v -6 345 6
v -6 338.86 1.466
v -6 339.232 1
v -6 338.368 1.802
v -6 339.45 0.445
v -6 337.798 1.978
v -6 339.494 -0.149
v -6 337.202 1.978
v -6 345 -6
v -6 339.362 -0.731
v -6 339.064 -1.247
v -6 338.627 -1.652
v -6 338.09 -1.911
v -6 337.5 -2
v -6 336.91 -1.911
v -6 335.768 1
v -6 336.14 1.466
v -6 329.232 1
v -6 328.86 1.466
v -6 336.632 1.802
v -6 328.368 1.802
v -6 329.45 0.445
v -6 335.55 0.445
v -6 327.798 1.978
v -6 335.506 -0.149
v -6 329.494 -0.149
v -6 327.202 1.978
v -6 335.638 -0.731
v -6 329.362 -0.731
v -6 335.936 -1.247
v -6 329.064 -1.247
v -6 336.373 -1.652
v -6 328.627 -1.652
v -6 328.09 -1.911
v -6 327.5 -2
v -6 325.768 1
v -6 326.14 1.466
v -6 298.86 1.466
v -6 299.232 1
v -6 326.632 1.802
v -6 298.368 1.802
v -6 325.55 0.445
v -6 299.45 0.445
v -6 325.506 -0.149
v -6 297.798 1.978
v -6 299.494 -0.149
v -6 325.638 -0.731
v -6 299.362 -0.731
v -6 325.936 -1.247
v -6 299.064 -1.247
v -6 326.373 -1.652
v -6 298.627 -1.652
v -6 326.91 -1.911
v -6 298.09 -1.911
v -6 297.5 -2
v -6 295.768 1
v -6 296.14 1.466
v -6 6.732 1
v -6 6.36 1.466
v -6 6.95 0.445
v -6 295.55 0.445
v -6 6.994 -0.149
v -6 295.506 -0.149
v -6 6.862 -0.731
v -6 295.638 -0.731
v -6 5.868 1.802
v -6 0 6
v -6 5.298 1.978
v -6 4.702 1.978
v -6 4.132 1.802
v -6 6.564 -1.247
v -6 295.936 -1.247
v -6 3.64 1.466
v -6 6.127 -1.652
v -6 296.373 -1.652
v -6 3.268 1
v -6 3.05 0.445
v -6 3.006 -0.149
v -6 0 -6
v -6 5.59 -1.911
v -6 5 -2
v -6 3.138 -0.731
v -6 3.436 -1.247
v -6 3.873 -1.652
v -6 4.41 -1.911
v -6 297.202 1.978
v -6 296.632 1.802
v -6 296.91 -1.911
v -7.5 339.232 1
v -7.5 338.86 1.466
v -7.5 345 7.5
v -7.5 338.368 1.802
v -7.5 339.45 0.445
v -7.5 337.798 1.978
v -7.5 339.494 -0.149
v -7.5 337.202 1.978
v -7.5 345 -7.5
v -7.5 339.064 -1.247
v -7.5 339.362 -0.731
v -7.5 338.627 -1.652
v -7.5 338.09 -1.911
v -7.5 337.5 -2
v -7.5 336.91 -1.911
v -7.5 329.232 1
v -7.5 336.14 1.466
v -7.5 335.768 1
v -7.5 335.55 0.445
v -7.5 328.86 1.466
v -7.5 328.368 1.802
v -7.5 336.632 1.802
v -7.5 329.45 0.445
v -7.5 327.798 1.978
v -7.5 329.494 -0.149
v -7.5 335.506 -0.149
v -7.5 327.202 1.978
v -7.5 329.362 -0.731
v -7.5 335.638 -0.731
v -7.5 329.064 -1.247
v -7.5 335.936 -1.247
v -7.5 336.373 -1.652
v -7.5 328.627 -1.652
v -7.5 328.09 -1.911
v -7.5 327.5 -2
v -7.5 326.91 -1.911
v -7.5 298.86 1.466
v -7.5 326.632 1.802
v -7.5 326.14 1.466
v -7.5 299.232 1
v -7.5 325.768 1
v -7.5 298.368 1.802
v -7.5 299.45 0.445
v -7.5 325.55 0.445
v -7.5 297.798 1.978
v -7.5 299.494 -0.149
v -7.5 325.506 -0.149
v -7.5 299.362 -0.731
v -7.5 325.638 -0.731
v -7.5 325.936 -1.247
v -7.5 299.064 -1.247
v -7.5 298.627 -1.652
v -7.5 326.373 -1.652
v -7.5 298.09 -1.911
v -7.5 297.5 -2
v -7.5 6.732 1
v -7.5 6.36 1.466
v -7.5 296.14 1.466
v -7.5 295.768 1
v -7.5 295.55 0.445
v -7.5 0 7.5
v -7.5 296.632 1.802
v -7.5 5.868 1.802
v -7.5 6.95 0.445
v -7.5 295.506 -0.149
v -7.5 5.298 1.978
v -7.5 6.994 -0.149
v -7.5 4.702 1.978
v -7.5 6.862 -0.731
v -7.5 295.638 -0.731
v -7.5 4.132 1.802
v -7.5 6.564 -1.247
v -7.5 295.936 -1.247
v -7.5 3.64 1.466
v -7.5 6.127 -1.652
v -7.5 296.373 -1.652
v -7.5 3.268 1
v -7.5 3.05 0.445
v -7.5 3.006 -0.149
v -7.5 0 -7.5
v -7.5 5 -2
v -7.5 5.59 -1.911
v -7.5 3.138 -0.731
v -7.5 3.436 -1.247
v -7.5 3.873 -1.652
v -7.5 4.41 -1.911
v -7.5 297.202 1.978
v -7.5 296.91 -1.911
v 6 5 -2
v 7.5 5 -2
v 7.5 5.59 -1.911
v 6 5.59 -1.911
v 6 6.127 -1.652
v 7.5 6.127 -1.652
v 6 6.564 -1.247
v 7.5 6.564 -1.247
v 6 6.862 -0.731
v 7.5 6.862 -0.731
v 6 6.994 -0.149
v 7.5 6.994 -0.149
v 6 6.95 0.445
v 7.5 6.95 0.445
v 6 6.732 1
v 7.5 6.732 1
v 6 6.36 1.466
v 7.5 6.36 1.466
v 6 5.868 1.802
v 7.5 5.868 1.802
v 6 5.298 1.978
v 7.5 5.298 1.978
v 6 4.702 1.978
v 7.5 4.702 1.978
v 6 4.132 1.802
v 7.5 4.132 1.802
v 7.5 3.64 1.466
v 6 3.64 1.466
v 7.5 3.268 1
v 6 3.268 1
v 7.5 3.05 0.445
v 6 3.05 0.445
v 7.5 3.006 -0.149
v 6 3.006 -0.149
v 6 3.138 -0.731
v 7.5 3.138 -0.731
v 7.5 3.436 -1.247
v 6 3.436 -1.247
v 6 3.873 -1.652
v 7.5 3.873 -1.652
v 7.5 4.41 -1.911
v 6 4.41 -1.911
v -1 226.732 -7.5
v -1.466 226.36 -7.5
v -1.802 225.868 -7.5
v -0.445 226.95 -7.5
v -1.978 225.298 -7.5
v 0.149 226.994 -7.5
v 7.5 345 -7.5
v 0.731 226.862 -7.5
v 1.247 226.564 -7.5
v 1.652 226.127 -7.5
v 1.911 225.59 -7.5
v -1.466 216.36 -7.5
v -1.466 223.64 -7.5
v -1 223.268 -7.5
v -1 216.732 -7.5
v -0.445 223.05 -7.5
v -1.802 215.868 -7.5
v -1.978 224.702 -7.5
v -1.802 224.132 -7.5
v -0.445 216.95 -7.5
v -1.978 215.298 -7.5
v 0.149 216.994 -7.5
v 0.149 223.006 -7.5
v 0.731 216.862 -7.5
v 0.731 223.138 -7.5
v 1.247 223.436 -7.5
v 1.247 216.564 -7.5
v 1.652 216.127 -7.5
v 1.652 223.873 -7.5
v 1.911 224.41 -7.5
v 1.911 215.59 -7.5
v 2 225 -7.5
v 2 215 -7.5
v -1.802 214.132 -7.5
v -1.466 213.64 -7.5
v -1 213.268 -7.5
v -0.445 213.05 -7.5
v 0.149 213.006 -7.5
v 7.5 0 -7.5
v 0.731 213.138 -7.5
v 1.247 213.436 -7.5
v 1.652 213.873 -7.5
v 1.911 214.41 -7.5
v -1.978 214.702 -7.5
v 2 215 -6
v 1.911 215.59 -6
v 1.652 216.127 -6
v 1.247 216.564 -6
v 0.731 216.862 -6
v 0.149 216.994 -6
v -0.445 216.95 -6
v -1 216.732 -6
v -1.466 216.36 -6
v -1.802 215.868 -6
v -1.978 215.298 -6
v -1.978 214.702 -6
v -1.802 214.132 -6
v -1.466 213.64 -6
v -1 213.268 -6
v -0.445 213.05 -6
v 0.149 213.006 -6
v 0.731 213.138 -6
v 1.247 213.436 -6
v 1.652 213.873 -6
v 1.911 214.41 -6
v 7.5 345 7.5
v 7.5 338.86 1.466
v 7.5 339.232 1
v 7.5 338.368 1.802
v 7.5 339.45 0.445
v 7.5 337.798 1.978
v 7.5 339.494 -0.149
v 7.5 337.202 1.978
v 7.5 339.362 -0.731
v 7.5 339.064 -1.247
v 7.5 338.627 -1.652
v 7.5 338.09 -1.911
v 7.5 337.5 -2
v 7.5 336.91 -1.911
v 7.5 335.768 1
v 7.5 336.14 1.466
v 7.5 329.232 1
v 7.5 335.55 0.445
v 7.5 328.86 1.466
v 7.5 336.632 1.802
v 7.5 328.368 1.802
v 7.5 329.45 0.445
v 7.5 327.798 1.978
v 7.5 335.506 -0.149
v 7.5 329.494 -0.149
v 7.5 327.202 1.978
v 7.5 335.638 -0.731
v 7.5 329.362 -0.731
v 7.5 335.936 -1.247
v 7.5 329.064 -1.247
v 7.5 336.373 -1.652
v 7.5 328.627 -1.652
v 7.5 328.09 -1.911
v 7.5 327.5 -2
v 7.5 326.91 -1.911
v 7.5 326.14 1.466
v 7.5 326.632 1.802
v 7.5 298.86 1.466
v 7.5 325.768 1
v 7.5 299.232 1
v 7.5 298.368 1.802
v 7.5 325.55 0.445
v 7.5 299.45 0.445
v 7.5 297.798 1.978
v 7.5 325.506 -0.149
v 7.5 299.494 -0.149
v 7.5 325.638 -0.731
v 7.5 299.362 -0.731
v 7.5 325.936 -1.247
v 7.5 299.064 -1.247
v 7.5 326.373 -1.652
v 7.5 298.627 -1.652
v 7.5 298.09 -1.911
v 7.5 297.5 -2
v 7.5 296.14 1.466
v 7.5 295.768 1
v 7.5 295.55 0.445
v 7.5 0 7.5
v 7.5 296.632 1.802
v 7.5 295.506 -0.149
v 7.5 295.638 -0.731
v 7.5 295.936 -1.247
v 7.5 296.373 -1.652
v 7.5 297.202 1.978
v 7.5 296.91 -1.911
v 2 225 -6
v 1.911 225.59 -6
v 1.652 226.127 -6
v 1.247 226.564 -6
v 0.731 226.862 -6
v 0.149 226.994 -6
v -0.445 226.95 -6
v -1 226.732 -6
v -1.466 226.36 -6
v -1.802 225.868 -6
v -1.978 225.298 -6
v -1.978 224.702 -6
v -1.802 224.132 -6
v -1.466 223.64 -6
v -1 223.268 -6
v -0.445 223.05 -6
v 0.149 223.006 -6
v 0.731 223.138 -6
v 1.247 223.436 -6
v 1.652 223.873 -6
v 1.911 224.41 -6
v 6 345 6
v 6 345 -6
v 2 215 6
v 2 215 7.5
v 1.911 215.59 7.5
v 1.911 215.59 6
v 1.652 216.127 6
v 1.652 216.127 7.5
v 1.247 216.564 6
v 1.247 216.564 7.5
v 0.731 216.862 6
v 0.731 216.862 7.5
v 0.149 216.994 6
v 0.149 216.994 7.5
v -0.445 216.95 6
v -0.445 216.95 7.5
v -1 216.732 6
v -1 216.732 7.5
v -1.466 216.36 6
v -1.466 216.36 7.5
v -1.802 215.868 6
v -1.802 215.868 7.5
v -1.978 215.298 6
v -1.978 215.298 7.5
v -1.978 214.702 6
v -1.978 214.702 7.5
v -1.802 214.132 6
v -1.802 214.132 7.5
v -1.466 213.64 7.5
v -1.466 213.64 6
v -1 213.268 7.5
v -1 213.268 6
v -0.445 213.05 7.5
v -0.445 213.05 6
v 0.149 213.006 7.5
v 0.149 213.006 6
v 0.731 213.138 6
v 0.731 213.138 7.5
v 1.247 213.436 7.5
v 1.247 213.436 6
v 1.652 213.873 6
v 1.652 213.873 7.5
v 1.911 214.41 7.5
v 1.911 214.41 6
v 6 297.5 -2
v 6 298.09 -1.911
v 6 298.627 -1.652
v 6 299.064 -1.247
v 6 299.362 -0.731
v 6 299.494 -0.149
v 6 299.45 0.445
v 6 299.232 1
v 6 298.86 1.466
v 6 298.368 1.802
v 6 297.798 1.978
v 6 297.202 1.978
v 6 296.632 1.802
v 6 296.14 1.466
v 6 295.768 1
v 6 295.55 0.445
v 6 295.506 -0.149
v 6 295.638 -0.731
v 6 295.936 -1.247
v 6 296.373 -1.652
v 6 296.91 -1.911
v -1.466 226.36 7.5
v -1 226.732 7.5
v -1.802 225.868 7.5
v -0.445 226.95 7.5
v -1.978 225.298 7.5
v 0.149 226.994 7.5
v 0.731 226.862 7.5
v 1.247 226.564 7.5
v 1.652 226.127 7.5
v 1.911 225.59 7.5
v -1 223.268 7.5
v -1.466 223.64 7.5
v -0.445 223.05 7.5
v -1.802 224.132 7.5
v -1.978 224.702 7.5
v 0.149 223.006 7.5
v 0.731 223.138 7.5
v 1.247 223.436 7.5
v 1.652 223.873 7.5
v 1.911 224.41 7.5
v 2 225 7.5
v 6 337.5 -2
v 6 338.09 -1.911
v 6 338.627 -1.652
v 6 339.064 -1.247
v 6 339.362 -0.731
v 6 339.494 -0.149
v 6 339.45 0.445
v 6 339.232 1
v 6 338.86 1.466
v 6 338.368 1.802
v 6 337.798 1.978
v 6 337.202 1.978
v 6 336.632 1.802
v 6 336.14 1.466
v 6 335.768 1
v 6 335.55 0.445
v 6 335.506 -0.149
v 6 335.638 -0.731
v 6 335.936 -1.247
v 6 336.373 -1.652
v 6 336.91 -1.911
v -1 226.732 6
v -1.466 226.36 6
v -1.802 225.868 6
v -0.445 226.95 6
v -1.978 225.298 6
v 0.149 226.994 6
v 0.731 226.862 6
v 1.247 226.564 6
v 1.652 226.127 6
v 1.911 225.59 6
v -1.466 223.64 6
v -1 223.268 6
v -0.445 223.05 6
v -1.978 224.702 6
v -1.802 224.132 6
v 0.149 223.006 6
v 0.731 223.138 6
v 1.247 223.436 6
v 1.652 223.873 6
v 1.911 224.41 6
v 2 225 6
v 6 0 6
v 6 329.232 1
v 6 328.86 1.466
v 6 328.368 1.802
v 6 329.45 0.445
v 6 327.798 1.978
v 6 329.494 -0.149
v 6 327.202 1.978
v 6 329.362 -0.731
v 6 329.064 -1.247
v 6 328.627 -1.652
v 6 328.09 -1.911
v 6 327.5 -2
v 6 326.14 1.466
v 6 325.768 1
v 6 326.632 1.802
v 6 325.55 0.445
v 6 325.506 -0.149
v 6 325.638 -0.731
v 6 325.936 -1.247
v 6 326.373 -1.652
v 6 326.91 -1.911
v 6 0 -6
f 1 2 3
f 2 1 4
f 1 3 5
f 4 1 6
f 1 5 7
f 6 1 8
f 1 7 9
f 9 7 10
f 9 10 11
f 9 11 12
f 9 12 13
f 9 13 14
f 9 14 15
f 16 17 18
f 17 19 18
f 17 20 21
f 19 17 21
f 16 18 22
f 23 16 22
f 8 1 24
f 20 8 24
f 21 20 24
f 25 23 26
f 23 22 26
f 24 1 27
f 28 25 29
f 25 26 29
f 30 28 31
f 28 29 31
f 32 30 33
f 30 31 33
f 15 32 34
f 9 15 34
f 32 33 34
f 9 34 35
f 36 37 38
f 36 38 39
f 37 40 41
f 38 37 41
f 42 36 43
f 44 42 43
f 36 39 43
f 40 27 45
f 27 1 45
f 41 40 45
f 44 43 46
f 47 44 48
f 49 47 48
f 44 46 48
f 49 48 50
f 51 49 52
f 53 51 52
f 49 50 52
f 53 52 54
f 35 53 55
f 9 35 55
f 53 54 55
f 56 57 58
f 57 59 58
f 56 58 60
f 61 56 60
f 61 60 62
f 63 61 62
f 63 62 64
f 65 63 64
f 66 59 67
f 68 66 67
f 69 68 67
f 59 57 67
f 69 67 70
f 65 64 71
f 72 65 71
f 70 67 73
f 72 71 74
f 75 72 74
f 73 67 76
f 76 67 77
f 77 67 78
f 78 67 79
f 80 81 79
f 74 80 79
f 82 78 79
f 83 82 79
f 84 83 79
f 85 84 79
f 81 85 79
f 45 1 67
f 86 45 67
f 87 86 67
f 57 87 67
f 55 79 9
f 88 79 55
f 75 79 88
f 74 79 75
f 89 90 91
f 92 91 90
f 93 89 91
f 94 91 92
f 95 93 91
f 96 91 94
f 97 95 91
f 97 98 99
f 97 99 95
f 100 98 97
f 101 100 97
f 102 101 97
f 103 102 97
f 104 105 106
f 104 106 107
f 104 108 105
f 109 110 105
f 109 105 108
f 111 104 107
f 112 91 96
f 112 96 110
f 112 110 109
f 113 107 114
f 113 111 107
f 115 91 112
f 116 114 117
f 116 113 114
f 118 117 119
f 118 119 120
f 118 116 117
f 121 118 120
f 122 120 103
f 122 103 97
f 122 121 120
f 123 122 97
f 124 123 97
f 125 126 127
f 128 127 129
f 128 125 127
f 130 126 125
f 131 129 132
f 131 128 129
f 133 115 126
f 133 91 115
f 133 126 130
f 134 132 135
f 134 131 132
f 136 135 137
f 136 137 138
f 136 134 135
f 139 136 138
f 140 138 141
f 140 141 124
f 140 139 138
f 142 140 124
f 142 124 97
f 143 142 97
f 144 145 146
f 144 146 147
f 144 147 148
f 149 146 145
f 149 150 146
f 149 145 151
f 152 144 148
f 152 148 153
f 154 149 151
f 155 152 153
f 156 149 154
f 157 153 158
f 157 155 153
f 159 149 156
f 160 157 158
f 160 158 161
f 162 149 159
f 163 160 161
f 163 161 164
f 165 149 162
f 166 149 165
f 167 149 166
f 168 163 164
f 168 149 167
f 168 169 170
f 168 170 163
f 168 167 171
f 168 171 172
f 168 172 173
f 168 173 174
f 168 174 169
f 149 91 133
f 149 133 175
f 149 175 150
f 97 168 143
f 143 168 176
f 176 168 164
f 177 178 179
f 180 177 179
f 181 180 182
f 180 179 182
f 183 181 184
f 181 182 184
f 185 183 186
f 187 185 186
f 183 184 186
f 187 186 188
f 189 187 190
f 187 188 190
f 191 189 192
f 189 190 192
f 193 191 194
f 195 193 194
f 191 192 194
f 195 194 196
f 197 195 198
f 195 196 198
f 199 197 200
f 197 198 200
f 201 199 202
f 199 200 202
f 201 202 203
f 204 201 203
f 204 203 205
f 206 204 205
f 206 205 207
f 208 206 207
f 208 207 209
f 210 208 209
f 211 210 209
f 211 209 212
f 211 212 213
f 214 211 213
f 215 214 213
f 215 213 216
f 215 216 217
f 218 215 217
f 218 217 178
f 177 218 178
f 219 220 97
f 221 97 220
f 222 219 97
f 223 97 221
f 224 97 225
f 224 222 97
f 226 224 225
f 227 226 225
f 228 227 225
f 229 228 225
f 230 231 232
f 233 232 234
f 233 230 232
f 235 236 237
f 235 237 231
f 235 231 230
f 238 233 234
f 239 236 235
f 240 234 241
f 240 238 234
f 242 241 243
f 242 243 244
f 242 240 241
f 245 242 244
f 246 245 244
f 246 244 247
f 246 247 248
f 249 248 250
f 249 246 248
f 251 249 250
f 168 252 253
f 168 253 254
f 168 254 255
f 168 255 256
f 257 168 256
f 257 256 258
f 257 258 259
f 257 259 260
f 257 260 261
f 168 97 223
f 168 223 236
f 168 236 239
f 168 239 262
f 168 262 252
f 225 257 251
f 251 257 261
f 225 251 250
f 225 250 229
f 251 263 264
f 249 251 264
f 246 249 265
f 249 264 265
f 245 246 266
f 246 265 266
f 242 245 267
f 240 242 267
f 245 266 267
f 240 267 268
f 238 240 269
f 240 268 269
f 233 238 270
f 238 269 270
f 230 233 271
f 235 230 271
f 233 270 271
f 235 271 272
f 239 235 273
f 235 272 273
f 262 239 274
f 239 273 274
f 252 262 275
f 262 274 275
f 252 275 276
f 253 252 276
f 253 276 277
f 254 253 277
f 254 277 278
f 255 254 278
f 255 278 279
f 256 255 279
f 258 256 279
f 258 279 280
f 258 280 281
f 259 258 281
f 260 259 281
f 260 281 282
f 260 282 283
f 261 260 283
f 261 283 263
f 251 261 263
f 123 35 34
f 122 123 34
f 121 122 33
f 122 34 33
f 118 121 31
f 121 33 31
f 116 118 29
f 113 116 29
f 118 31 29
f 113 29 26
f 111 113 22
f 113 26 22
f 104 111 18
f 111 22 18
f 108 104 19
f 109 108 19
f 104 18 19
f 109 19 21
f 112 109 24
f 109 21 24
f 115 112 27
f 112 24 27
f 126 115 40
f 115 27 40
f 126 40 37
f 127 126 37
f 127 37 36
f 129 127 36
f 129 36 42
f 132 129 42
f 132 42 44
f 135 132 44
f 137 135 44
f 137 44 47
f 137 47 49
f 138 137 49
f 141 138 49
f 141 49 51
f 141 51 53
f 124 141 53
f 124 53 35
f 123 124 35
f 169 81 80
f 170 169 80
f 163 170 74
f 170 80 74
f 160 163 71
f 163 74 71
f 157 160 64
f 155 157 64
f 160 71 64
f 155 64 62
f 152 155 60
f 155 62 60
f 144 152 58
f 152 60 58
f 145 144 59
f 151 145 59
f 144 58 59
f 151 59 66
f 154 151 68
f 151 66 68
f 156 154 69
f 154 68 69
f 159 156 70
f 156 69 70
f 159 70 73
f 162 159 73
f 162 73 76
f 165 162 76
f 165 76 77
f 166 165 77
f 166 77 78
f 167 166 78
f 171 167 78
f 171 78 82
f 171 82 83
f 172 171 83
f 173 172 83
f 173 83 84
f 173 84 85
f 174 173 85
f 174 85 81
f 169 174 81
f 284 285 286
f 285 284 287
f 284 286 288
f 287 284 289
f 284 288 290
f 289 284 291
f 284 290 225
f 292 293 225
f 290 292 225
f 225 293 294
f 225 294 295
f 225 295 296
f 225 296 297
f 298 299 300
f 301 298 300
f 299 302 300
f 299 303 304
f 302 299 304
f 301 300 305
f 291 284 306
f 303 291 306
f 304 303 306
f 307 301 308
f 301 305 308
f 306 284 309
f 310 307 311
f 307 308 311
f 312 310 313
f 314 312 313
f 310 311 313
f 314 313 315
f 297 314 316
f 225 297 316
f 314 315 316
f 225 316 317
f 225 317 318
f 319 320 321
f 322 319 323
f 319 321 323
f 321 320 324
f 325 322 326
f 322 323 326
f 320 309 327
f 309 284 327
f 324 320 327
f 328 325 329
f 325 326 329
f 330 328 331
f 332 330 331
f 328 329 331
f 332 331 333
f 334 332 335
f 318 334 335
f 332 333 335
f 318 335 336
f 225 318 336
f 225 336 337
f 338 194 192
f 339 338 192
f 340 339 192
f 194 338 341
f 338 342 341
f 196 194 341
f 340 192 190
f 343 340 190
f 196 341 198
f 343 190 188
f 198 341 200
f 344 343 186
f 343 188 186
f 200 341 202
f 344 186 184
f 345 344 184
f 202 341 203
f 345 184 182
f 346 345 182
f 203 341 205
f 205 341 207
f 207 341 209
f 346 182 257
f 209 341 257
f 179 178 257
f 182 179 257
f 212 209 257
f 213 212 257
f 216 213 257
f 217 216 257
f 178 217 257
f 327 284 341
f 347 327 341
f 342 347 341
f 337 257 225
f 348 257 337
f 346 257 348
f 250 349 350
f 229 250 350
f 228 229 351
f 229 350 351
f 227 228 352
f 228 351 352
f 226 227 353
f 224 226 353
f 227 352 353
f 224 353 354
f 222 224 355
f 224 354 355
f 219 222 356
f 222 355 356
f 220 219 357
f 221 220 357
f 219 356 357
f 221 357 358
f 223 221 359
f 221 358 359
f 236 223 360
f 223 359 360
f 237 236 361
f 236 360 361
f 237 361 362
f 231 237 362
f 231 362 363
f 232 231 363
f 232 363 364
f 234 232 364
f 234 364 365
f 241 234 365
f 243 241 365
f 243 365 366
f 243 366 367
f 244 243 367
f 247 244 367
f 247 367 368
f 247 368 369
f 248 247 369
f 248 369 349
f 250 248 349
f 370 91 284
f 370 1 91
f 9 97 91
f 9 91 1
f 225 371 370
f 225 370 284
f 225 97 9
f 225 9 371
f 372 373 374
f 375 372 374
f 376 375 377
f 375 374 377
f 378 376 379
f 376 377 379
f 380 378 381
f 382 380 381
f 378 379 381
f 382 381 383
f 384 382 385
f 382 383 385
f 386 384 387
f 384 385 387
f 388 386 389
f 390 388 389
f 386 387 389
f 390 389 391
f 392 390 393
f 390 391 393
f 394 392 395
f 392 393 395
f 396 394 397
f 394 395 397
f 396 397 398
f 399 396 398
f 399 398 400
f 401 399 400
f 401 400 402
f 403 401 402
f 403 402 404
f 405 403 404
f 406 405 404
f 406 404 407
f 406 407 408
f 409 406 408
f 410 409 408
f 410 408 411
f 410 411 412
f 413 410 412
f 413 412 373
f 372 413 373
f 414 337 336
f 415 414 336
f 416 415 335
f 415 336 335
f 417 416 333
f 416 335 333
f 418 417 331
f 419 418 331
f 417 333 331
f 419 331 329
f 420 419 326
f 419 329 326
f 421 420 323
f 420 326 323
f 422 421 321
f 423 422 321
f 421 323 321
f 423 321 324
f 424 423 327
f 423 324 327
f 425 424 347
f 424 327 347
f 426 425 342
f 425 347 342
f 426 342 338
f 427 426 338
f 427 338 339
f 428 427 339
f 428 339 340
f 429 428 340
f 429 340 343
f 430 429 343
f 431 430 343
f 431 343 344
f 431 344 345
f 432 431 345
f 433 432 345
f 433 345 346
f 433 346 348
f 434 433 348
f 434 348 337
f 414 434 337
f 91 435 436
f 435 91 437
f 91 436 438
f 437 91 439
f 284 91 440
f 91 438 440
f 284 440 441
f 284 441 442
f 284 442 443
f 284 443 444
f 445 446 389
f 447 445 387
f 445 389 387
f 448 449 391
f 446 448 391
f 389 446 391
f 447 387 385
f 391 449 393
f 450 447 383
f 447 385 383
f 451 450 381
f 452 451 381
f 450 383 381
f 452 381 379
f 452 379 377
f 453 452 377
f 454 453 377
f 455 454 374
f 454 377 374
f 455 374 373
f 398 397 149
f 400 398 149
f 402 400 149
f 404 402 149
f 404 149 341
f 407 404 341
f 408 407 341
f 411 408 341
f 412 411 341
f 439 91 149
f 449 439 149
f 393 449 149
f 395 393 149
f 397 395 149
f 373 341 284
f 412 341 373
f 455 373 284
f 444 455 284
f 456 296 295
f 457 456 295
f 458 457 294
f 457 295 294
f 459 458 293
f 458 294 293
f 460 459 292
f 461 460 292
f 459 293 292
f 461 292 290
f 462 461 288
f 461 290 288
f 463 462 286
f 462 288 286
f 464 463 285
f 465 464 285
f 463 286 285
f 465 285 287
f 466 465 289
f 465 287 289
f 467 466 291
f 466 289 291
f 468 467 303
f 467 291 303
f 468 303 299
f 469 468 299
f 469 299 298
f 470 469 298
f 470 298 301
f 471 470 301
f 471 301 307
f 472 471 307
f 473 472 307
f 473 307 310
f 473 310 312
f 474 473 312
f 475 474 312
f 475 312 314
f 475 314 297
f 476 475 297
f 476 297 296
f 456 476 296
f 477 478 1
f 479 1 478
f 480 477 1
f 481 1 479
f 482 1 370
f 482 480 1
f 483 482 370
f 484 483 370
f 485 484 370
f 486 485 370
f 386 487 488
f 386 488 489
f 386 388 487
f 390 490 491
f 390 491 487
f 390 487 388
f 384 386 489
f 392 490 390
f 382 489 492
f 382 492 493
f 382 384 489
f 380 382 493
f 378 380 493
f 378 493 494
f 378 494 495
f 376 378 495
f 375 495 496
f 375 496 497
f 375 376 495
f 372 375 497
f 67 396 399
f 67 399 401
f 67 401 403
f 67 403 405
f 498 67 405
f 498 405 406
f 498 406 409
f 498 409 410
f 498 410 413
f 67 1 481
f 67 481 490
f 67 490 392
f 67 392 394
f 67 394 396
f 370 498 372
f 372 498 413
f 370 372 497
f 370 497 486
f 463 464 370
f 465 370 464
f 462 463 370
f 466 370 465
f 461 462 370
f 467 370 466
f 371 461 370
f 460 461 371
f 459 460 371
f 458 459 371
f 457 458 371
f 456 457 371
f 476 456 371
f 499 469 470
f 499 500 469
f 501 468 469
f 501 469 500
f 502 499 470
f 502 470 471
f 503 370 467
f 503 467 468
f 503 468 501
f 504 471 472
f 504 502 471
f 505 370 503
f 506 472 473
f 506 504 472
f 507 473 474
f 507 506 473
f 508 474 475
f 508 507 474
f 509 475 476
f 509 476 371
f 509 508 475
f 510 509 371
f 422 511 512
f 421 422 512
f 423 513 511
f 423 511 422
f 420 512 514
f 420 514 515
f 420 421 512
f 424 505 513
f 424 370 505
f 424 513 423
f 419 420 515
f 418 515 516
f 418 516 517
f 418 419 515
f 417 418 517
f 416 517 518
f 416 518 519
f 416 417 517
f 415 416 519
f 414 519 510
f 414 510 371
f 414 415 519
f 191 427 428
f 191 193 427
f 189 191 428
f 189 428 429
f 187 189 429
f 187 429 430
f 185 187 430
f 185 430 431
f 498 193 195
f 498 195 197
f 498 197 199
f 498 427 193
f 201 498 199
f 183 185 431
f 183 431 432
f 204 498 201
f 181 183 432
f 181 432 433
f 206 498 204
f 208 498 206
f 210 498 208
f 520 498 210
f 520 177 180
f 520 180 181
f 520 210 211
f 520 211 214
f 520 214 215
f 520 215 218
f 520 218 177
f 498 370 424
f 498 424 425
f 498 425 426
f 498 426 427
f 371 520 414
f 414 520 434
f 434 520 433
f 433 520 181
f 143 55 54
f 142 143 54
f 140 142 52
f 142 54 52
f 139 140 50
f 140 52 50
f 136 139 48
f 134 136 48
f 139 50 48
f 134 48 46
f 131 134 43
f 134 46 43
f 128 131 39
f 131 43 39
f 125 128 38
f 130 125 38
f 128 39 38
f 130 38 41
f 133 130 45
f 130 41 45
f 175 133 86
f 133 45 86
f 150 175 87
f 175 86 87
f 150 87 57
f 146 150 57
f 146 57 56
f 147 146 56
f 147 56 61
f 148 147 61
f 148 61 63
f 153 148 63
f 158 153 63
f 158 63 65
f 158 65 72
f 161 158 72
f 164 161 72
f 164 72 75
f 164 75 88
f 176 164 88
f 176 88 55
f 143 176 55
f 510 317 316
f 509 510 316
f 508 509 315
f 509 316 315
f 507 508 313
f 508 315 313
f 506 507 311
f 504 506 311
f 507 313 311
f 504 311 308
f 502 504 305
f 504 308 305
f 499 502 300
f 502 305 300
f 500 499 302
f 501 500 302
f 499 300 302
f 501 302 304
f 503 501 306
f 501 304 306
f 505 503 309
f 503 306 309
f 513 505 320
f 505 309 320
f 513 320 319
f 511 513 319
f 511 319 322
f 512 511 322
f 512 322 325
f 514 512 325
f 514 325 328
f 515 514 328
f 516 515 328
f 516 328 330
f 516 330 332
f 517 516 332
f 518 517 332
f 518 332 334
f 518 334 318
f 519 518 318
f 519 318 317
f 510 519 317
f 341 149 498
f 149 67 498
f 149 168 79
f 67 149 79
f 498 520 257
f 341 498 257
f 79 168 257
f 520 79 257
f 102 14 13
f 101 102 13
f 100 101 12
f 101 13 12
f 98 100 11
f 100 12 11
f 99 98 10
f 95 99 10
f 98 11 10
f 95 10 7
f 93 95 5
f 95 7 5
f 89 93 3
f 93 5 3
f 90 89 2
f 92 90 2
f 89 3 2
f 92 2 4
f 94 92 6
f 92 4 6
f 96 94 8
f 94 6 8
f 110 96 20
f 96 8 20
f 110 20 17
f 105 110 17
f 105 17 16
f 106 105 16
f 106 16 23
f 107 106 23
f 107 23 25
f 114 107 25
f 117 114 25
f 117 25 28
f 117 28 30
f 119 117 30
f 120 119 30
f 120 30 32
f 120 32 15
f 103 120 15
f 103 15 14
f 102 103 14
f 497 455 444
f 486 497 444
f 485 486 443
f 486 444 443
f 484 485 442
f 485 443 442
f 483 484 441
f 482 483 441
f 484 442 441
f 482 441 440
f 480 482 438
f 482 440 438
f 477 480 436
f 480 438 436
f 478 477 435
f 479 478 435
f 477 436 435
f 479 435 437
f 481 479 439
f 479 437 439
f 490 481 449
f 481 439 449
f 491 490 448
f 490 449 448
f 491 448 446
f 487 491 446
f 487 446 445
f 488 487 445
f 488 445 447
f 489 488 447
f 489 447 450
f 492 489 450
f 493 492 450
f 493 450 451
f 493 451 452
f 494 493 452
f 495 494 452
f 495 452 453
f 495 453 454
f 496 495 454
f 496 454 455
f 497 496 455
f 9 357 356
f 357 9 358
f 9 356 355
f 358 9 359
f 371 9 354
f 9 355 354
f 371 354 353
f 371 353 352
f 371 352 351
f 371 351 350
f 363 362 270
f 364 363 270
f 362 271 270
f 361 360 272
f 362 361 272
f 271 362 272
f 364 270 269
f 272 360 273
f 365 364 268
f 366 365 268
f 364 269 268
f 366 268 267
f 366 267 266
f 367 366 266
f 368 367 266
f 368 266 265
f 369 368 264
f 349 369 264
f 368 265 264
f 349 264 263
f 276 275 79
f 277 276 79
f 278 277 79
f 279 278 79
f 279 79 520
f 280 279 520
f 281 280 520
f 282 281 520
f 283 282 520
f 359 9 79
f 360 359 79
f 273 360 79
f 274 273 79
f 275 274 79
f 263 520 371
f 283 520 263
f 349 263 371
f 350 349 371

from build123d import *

# Parameters (mm, degrees)
SKETCH_1_W          = 15
SKETCH_1_H          = 15
SKETCH_1_W_2        = 12
SKETCH_1_H_2        = 12
EXTRUDE_1_DEPTH     = 345
SKETCH_2_R          = 2
CUT_EXTRUDE_1_DEPTH = 346.40736819
SKETCH_3_R          = 2
CUT_EXTRUDE_2_DEPTH = 346.40736819


with BuildPart() as part:
    # ｽｹｯﾁ1 → 押し出し-薄板1 (new body)
    with BuildSketch(Plane(origin=(0, 0, 0), x_dir=(1, 0, 0), z_dir=(0, 1, 0))):
        Rectangle(SKETCH_1_W, SKETCH_1_H)
        Rectangle(SKETCH_1_W_2, SKETCH_1_H_2, mode=Mode.SUBTRACT)
    extrude(amount=EXTRUDE_1_DEPTH)

    # ｽｹｯﾁ2 → ｶｯﾄ - 押し出し1 (cut, through all)
    with BuildSketch(Plane(origin=(7.5, 0, 0), x_dir=(0, 0, -1), z_dir=(1, 0, 0))):
        with Locations((0, 5)):
            Circle(SKETCH_2_R)
        with Locations((0, 297.5)):
            Circle(SKETCH_2_R)
        with Locations((0, 337.5)):
            Circle(SKETCH_2_R)
        with Locations((0, 327.5)):
            Circle(SKETCH_2_R)
    extrude(amount=-CUT_EXTRUDE_1_DEPTH, mode=Mode.SUBTRACT)

    # ｽｹｯﾁ3 → ｶｯﾄ - 押し出し2 (cut, through all)
    with BuildSketch(Plane.XY.offset(7.5)):
        with Locations((0, 225)):
            Circle(SKETCH_3_R)
        with Locations((0, 215)):
            Circle(SKETCH_3_R)
    extrude(amount=-CUT_EXTRUDE_2_DEPTH, mode=Mode.SUBTRACT)


solid = part.part
